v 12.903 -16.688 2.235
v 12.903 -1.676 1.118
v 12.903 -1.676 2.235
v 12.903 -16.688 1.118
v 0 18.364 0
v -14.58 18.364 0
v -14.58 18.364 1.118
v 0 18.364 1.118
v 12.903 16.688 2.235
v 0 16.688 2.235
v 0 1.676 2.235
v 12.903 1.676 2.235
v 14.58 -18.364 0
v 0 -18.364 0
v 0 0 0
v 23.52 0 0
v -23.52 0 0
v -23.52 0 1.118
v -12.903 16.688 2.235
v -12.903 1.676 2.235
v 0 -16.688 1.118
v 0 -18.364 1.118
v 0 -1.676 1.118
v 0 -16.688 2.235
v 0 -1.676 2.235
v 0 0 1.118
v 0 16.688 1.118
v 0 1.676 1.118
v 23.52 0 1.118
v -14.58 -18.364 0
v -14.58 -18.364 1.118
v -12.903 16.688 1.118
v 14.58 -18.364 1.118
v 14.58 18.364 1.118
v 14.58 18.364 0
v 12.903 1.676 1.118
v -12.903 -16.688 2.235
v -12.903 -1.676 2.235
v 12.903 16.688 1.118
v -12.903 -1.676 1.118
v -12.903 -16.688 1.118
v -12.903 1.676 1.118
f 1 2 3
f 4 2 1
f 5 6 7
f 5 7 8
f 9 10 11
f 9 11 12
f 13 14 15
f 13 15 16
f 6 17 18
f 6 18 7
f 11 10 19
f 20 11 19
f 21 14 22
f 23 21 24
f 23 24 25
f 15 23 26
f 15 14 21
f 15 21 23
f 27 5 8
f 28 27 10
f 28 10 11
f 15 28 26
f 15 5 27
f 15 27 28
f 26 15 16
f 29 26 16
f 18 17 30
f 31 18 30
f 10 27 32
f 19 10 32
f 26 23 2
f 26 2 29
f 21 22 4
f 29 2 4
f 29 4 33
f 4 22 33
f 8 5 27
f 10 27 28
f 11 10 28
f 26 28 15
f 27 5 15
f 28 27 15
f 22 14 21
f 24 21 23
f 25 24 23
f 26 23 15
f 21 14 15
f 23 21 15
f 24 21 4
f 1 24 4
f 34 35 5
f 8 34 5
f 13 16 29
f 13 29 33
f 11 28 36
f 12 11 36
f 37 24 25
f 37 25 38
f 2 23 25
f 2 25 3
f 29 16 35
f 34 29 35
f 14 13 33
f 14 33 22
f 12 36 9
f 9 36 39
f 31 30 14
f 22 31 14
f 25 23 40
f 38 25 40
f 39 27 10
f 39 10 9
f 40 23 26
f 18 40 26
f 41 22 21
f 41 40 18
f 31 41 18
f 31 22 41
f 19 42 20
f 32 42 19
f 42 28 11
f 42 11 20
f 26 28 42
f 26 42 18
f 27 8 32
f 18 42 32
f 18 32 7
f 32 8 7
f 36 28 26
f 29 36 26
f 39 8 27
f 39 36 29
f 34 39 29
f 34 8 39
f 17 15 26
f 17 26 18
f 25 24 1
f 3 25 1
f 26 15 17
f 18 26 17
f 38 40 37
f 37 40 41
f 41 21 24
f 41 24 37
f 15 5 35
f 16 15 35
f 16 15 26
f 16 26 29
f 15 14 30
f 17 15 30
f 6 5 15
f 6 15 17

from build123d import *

# Parameters (mm, degrees)
F1_DEPTH = 1.1176
F2_W     = 12.9032
F2_H     = 15.0114
F3_DEPTH = 1.1176


with BuildPart() as f1:
    # F0 (on Top) → F1 (new body)
    with BuildSketch(Plane.XY):
        Polygon((0, 18.3642), (0, 0), (23.5204, 0), (14.5796, 18.3642), align=None)
    extrude(amount=F1_DEPTH)

    # F2 (on face) → F3 (join)
    with BuildSketch(Plane.XY.offset(1.1176)):
        with Locations((6.4516, 9.1821)):
            Rectangle(F2_W, F2_H)
    extrude(amount=F3_DEPTH)


with BuildPart() as f4_1:
    # F4: instance of F1
    add(f1.part.mirror(Plane(origin=(0, 9.1821, 1.061465), x_dir=(0, -1, 0), z_dir=(-1, 0, 0))))


with BuildPart() as f5_1:
    # F5: instance of F4_1
    add(f4_1.part.mirror(Plane.XZ))


with BuildPart() as f5_2:
    # F5: instance of F1
    add(f1.part.mirror(Plane.XZ))


solid = Compound([f1.part, f4_1.part, f5_1.part, f5_2.part])
